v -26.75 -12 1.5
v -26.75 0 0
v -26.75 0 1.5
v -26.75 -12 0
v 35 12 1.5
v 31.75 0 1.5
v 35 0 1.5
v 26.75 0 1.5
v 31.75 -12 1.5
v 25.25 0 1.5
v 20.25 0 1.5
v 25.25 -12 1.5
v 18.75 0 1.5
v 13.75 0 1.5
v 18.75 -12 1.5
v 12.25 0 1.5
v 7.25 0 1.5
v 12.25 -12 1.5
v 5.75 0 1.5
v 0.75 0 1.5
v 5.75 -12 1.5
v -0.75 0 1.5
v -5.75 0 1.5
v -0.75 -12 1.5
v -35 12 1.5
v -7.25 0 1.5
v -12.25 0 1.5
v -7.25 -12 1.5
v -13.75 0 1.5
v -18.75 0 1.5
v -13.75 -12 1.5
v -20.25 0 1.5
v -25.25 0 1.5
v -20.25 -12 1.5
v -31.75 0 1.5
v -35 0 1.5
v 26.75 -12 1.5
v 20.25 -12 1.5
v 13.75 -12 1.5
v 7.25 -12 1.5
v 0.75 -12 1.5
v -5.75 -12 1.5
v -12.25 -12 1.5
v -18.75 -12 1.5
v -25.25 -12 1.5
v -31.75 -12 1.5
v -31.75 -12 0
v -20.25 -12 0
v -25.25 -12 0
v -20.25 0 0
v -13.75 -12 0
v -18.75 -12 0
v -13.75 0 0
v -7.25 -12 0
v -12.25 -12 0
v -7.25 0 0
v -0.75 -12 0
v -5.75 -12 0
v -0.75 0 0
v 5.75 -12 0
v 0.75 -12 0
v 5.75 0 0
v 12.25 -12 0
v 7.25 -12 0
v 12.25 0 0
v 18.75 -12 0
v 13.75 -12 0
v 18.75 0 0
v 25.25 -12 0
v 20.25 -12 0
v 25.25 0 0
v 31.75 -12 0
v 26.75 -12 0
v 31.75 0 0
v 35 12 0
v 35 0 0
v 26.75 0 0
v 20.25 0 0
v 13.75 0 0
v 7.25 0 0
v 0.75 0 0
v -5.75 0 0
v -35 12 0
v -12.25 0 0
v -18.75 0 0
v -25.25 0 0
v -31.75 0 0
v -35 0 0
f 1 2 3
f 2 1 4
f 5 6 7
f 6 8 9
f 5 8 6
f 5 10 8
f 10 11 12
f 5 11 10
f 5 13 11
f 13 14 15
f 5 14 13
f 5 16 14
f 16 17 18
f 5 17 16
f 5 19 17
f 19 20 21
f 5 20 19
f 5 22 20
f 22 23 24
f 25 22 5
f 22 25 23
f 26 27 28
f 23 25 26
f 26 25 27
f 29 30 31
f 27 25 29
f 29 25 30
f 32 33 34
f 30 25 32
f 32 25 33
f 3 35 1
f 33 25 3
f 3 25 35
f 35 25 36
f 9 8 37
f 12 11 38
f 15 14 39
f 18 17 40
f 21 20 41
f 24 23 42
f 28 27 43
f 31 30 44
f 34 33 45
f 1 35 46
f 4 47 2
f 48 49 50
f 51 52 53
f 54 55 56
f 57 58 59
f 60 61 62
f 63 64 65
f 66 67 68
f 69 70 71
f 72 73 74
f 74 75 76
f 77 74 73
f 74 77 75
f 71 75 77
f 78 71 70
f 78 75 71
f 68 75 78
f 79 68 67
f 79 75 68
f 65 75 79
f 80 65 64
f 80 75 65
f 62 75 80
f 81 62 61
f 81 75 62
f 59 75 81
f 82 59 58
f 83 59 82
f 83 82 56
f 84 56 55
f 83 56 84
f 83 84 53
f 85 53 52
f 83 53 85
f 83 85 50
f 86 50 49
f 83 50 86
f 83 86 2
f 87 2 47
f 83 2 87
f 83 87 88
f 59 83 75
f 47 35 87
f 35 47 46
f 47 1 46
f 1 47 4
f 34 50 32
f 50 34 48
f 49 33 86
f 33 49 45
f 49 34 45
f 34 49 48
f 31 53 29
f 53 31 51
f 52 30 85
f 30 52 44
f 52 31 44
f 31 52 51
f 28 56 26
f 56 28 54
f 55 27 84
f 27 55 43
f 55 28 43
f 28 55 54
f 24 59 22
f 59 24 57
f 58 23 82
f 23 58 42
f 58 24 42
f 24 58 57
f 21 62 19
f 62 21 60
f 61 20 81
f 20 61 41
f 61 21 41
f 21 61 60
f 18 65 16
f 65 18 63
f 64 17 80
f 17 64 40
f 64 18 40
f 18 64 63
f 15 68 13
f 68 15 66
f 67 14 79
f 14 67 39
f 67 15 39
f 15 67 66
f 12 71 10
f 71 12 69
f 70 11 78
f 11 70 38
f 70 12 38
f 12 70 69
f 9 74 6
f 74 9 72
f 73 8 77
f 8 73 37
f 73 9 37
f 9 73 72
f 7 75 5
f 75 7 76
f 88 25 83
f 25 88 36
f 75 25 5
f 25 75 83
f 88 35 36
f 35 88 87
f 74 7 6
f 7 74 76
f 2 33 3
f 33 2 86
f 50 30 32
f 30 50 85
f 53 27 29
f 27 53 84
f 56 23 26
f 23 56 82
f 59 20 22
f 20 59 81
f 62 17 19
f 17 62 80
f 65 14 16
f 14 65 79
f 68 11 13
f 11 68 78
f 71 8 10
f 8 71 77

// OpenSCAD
// 10-well agarose gel comb - printed lying flat
// Units: mm

$fn = 64;

// ---- Parameters ----
plate_t     = 1.5;   // plate thickness (Z)
spine_len   = 70;    // spine length (X)
spine_w     = 12;    // spine width (Y)
n_teeth     = 10;    // number of teeth / wells
tooth_w     = 5.0;   // tooth width (X)
tooth_len   = 12;    // tooth length (Y), hanging in -Y
tooth_gap   = 1.5;   // gap between neighbouring teeth (X)
overlap     = 0.5;   // tooth overlap into spine for a solid union

// ---- Derived ----
row_w   = n_teeth * tooth_w + (n_teeth - 1) * tooth_gap; // total width of tooth row
total_y = spine_w + tooth_len;                           // overall Y extent
y0      = -total_y / 2;                                  // bottom (tooth tips) Y
spine_y = y0 + tooth_len;                                // spine lower edge Y

// ---- Model ----
union() {
    // Spine (back bar)
    translate([-spine_len / 2, spine_y, 0])
        cube([spine_len, spine_w, plate_t]);

    // Teeth, centred on spine in X
    for (i = [0 : n_teeth - 1])
        translate([-row_w / 2 + i * (tooth_w + tooth_gap), y0, 0])
            cube([tooth_w, tooth_len + overlap, plate_t]);
}
